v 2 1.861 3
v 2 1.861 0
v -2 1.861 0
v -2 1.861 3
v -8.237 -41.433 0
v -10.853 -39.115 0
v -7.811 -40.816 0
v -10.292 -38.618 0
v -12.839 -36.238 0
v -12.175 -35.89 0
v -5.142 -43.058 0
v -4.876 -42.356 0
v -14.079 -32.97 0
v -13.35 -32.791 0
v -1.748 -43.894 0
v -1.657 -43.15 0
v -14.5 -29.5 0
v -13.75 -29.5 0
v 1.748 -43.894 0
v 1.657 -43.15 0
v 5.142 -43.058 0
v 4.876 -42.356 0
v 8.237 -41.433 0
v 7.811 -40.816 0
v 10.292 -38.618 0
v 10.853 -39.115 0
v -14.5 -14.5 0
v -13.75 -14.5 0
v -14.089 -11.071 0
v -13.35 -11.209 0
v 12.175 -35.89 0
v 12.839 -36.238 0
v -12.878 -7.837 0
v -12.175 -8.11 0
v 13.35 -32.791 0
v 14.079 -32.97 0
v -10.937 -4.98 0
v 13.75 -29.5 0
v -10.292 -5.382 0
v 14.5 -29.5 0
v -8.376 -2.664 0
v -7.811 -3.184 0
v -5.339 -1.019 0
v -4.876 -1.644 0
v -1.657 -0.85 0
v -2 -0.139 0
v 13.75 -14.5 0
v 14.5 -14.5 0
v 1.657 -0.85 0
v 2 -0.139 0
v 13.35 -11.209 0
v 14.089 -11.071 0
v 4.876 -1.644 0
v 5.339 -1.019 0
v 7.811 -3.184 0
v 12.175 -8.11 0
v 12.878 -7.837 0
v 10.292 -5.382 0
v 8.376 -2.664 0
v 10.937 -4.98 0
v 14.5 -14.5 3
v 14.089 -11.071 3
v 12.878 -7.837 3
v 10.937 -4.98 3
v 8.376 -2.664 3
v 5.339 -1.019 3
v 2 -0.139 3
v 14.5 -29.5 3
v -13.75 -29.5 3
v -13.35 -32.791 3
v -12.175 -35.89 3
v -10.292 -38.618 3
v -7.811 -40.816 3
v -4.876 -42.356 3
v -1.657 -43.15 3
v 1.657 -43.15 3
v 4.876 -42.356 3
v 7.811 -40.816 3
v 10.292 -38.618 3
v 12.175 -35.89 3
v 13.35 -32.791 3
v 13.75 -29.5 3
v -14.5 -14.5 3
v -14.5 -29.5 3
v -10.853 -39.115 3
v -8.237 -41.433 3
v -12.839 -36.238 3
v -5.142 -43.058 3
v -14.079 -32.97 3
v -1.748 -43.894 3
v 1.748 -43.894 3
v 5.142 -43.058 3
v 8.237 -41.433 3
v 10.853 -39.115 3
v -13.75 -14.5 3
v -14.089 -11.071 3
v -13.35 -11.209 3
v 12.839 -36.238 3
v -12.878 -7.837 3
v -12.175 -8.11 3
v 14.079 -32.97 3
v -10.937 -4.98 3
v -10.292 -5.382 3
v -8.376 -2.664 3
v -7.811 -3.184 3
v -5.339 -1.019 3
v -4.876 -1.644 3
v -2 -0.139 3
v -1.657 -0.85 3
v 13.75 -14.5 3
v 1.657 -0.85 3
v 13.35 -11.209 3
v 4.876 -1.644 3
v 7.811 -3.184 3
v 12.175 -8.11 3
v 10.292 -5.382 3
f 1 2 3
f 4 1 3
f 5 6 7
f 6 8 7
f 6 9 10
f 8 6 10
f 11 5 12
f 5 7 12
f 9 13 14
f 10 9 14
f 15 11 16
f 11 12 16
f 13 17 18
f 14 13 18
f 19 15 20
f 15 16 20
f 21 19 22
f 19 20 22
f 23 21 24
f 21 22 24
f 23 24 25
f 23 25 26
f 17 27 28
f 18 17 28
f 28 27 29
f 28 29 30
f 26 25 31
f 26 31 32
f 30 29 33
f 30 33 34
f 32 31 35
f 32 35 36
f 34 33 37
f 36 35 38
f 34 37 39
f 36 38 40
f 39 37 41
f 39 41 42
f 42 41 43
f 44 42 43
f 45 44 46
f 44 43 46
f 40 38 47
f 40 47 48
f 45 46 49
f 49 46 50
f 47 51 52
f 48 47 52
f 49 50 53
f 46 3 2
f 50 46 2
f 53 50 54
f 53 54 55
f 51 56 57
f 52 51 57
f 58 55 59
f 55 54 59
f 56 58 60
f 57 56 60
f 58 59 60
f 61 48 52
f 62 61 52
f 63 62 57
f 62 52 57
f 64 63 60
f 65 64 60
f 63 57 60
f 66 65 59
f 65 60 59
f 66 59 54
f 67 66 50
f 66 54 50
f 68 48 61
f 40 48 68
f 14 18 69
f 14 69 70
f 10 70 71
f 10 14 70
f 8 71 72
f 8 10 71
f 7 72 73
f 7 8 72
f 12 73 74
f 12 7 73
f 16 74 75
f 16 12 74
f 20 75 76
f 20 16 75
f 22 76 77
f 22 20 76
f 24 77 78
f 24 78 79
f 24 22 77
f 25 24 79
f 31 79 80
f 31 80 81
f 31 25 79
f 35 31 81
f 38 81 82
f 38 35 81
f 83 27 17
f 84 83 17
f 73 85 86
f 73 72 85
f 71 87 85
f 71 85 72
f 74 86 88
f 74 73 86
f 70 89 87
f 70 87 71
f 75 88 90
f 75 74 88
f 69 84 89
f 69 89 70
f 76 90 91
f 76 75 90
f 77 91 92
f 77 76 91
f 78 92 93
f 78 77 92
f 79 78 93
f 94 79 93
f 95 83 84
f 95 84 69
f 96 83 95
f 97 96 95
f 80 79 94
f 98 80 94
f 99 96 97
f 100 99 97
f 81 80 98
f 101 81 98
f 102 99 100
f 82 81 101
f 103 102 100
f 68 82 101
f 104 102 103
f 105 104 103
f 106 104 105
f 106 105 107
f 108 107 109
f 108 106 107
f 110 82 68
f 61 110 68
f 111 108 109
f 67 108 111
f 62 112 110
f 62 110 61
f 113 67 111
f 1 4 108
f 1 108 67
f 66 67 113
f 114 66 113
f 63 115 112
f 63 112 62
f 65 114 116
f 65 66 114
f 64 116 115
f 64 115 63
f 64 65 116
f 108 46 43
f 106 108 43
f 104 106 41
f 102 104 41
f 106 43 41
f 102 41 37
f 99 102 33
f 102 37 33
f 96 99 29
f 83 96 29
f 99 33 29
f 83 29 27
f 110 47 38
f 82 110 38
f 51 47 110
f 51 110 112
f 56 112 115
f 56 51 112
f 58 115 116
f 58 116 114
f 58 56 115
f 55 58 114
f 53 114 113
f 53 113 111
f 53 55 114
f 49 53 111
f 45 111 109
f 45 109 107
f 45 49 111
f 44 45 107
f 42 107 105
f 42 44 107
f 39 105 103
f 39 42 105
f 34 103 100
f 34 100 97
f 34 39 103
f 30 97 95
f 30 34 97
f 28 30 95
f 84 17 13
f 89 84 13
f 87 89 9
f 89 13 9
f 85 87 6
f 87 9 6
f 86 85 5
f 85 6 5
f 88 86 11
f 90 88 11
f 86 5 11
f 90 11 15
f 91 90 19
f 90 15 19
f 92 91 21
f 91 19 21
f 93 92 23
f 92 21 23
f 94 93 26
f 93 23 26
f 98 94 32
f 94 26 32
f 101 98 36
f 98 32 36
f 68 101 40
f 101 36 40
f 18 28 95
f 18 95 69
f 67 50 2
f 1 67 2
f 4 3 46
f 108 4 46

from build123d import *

# Parameters (mm, degrees)
PAD_DEPTH = 3


with BuildPart() as part:
    # Sketch → Pad (new body)
    with BuildSketch(Plane.XY):
        with BuildLine():
            ThreePointArc((-2, -0.138593), (-10.937318, -4.980279), (-14.5, -14.499988))
            Line((-14.5, -14.499988), (-14.5, -29.5))
            ThreePointArc((-14.5, -29.5), (6e-06, -44), (14.5, -29.499988))
            Line((14.5, -14.499962), (14.5, -29.499988))
            ThreePointArc((14.5, -14.499962), (10.937309, -4.980269), (2, -0.138593))
            Line((2, -0.138593), (2, 1.861407))
            Line((2, 1.861407), (-2, 1.861407))
            Line((-2, 1.861407), (-2, -0.138593))
        make_face()
        with BuildLine():
            ThreePointArc((13.75, -14.499989), (0, -0.75), (-13.75, -14.499989))
            Line((-13.75, -14.499989), (-13.75, -29.500003))
            ThreePointArc((-13.75, -29.500003), (1e-06, -43.25), (13.75, -29.5))
            Line((13.75, -14.499989), (13.75, -29.5))
        make_face(mode=Mode.SUBTRACT)
    extrude(amount=PAD_DEPTH)


solid = part.part
